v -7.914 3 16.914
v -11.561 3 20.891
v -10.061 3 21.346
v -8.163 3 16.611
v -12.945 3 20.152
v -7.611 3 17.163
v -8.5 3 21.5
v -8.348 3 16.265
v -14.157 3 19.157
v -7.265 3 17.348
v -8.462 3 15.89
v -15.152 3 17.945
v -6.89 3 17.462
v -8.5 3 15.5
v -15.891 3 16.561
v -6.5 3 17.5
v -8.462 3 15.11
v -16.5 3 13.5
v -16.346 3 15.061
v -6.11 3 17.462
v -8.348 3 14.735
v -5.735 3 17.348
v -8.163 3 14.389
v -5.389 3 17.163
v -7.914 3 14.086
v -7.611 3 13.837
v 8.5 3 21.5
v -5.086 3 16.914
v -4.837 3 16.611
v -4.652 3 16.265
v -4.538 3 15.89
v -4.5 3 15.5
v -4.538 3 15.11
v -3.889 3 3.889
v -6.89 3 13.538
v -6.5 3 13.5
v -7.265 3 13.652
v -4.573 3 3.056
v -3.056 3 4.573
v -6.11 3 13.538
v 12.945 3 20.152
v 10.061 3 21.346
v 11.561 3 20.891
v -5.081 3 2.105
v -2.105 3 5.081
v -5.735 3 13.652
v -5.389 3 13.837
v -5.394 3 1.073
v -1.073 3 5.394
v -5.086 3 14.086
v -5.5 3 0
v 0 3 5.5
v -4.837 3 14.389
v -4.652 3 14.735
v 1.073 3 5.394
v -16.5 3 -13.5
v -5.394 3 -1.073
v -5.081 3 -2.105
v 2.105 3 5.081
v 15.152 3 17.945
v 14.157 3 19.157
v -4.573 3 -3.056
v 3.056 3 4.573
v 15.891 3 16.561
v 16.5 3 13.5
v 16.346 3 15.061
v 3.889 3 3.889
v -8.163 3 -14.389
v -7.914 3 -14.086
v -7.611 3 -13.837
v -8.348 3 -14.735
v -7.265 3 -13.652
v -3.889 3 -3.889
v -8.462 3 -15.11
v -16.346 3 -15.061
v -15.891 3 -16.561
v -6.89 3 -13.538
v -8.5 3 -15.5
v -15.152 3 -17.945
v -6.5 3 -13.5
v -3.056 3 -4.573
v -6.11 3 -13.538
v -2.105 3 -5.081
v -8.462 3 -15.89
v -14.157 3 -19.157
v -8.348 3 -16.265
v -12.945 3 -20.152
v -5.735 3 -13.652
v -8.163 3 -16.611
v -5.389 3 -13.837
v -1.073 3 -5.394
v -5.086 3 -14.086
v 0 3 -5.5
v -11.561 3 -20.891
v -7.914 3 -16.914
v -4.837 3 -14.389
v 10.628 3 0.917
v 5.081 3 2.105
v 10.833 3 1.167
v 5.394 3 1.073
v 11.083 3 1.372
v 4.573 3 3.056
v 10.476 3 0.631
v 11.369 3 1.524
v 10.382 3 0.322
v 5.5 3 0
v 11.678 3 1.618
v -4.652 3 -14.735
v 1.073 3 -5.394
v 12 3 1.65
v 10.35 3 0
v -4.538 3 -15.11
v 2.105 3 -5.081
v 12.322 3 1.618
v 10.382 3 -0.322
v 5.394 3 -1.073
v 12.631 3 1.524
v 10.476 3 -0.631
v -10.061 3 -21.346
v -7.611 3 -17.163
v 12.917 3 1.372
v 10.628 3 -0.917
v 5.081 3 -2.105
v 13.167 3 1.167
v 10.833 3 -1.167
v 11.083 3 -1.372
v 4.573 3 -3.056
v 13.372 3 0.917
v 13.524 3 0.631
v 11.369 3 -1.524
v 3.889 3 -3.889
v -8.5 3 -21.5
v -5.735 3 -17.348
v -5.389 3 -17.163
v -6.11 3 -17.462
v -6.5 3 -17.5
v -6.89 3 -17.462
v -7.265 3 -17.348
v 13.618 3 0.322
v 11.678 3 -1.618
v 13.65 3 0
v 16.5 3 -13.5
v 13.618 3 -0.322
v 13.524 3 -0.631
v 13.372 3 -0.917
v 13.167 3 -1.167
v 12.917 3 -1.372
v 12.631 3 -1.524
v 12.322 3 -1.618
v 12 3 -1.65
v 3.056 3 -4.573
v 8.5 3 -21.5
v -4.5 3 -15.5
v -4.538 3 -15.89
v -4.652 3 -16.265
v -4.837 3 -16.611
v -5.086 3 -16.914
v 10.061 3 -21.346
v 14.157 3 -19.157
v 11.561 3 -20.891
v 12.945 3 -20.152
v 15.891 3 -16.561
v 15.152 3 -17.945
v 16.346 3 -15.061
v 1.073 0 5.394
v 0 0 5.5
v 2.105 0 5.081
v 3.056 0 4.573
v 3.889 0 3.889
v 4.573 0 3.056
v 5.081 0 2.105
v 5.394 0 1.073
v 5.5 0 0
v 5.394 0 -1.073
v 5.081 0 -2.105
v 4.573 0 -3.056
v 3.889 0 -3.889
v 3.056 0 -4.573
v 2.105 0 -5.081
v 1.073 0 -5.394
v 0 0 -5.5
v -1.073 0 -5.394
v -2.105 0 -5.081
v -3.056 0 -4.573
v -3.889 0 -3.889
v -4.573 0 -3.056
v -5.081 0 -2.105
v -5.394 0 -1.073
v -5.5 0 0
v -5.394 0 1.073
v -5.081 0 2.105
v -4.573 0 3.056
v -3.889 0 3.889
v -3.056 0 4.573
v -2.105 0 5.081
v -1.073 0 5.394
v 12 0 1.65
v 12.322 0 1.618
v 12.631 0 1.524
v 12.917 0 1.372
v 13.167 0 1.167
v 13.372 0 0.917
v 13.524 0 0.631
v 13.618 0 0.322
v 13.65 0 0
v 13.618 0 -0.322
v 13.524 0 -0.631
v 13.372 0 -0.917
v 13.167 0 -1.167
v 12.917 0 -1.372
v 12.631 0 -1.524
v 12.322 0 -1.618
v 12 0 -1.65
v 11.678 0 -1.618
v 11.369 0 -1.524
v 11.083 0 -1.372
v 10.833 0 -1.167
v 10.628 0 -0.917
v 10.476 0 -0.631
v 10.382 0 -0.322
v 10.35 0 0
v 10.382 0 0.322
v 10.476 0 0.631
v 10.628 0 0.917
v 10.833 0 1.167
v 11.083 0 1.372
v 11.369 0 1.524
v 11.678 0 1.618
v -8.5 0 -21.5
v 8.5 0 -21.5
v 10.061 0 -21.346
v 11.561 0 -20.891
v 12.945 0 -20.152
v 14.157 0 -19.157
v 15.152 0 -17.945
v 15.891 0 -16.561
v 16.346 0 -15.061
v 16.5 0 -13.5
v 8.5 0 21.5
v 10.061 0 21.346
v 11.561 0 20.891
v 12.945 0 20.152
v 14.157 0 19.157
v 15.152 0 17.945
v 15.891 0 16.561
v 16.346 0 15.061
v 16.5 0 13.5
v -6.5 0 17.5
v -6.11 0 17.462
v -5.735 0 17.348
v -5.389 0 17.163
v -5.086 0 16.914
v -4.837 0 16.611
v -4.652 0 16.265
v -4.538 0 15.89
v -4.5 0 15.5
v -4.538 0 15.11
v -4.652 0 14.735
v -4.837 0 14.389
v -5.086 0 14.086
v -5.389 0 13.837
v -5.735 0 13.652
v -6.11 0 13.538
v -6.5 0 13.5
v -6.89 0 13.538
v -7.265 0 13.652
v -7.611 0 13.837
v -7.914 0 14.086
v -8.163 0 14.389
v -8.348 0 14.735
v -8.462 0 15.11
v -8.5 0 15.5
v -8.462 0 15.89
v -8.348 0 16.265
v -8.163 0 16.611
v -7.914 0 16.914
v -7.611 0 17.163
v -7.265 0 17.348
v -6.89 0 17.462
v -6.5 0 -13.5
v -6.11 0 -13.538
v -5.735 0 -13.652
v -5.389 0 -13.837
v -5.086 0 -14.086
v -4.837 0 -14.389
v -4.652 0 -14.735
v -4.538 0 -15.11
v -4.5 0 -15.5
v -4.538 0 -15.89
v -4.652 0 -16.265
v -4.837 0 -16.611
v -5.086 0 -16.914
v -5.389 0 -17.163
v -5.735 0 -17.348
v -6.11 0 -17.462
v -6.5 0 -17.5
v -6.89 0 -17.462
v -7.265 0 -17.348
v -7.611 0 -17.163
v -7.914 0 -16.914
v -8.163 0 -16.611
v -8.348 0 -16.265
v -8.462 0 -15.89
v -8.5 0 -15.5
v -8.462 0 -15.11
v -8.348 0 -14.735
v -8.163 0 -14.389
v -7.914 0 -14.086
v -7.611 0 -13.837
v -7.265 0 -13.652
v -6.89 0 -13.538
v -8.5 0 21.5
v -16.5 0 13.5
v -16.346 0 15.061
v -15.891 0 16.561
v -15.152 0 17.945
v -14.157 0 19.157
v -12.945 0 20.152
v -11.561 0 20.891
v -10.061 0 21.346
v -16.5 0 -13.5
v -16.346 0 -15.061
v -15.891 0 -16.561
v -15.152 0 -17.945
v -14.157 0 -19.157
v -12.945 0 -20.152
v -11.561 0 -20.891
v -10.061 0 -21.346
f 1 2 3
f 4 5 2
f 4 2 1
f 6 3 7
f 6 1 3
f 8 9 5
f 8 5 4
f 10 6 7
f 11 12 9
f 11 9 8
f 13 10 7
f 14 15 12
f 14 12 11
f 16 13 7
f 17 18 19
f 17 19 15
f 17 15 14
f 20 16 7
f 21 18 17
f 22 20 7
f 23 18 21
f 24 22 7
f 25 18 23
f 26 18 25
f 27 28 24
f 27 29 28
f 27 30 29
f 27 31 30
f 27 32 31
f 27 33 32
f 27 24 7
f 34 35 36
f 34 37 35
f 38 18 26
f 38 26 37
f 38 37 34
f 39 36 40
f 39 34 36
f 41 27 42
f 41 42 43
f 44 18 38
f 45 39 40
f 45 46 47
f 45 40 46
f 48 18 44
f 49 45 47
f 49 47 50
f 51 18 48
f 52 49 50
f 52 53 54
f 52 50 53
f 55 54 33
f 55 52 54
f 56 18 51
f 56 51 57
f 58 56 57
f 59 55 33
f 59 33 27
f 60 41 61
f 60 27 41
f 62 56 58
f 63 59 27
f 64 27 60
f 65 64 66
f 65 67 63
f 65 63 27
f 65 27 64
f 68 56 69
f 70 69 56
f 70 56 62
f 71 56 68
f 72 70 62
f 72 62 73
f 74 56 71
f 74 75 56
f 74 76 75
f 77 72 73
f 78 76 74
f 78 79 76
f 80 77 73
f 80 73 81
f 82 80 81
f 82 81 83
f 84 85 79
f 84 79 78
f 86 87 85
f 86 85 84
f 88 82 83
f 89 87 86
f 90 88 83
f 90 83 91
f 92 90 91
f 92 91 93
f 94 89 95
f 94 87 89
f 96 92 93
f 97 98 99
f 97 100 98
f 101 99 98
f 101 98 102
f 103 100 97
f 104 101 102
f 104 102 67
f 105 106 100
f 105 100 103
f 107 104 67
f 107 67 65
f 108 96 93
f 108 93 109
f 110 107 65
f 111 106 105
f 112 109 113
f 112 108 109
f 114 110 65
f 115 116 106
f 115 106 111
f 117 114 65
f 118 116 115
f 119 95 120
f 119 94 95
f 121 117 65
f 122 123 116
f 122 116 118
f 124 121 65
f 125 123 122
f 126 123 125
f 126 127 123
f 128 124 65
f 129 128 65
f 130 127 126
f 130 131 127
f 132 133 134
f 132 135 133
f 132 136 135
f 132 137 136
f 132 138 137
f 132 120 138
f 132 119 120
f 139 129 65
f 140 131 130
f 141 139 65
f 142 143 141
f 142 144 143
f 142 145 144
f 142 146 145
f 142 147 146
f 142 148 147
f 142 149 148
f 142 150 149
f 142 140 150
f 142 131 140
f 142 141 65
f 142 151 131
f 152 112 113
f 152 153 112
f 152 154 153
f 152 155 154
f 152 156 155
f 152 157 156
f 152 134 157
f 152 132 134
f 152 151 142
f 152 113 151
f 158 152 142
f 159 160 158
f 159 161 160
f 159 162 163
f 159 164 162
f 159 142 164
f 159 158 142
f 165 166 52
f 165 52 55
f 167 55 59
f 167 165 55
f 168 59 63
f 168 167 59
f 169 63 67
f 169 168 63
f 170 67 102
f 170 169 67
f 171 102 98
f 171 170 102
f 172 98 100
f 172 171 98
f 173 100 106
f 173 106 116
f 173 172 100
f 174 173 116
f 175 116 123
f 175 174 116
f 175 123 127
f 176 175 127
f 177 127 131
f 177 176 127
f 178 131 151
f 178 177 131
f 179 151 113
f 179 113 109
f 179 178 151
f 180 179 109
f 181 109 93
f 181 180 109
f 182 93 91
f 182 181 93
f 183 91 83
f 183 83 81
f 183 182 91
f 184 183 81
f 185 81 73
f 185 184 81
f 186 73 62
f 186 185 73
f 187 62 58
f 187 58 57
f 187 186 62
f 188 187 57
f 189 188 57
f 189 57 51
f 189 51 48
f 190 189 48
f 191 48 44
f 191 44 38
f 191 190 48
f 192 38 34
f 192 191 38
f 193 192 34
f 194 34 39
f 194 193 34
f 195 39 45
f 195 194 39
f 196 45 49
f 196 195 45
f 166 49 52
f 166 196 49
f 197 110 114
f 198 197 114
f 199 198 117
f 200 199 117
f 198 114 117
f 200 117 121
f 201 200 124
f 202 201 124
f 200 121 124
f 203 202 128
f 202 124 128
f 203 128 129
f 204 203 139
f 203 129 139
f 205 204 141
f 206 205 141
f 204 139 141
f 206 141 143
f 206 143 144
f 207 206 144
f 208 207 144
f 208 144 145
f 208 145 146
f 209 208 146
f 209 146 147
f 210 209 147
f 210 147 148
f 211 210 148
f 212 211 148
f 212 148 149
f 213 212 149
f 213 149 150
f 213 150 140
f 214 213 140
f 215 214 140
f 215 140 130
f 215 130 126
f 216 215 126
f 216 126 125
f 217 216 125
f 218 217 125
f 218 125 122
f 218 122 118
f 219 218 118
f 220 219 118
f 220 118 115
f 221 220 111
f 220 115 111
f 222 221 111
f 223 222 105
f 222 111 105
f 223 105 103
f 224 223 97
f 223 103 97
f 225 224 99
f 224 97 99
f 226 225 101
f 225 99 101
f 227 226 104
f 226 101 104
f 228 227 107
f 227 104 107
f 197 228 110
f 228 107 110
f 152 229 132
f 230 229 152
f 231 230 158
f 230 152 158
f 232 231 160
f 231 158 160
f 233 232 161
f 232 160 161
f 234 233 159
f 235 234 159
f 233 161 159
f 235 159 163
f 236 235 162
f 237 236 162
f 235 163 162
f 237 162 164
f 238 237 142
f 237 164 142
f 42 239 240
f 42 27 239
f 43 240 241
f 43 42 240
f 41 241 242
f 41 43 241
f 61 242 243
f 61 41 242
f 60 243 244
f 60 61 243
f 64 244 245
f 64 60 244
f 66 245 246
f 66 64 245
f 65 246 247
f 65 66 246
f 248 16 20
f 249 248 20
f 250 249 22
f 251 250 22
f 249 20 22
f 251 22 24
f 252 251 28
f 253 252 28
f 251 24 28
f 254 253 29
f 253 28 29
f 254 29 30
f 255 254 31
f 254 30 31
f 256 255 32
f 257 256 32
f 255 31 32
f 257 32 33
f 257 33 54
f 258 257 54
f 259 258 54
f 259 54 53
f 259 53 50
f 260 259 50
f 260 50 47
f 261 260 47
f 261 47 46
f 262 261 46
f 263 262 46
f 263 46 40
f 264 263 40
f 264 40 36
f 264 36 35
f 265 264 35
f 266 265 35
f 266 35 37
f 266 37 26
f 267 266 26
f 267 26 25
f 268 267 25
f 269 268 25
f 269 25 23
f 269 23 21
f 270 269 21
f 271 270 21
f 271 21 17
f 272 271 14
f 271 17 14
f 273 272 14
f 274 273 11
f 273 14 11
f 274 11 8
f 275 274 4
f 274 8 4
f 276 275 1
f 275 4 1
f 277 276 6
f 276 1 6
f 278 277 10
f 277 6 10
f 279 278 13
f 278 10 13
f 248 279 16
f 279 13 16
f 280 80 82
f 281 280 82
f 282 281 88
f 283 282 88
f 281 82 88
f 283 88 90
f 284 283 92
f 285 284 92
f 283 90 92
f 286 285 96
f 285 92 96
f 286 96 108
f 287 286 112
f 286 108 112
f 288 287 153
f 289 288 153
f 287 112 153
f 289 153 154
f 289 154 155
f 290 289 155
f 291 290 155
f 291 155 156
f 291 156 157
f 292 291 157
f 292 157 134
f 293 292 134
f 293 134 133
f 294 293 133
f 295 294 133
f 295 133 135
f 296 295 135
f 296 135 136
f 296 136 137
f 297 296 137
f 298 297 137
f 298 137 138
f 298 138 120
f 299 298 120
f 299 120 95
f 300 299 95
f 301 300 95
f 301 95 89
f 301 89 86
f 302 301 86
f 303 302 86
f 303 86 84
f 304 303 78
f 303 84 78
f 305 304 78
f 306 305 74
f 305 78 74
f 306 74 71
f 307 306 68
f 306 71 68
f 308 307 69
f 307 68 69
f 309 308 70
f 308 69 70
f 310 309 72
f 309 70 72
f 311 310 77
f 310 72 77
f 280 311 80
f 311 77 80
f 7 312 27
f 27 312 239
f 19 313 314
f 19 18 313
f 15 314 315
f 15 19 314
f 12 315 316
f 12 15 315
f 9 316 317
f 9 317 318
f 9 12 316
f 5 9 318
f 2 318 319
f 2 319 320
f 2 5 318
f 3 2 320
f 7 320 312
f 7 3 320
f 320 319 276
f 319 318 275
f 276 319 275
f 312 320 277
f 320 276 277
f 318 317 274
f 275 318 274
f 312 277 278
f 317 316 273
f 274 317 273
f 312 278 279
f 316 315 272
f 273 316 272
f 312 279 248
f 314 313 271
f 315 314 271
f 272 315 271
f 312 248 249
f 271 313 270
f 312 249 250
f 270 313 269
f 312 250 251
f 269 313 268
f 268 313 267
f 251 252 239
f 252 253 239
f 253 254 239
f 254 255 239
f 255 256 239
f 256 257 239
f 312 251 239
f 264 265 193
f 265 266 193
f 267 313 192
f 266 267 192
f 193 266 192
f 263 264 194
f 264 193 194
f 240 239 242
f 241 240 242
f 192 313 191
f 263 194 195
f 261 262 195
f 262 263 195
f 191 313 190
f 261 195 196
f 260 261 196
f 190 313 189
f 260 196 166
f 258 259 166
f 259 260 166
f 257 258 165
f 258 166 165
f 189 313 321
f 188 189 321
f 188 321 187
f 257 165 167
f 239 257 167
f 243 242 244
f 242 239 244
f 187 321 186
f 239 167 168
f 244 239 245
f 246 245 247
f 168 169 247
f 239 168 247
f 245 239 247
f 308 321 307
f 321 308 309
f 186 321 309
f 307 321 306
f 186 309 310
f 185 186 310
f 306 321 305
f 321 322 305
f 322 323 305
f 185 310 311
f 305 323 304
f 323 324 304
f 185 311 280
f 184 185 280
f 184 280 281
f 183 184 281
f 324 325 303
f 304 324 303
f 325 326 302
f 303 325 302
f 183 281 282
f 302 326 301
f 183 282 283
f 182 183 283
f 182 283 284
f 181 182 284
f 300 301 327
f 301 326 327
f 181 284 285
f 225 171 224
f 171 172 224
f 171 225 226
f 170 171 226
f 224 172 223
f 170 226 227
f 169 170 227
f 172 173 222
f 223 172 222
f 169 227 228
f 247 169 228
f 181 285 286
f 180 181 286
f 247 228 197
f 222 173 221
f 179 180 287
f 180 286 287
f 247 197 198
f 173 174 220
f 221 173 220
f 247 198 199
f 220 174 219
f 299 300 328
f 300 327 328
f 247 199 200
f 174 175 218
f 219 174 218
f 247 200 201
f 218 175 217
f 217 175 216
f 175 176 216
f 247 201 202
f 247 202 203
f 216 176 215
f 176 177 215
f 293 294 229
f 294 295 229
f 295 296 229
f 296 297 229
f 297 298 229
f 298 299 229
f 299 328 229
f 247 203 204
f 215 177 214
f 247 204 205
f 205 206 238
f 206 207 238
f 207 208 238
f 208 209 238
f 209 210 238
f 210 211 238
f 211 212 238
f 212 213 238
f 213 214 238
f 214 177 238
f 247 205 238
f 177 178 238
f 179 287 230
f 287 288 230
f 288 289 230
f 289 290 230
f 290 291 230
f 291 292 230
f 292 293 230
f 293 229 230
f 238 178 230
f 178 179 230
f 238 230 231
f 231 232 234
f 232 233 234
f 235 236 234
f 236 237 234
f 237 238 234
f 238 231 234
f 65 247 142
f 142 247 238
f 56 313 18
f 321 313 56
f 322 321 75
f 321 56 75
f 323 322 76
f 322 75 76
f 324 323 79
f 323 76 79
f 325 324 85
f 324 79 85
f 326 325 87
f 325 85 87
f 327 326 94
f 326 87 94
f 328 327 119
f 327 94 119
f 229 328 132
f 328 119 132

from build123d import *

# Parameters (mm, degrees)
SKETCH1_W           = 33
SKETCH1_H           = 43
SKETCH1_R           = 5.5
BOSS_EXTRUDE1_DEPTH = 3
SKETCH2_R           = 2
SKETCH2_R_2         = 1.65
CUT_EXTRUDE1_DEPTH  = 10
FILLET1_R           = 8


with BuildPart() as part:
    # Sketch1 → Boss-Extrude1 (new body)
    with BuildSketch(Plane(origin=(0, 0, 0), x_dir=(1, 0, 0), z_dir=(0, 1, 0))):
        Rectangle(SKETCH1_W, SKETCH1_H)
        with Locations(Location((0, 0, 0), (0, 0, 270))):
            Circle(SKETCH1_R, mode=Mode.SUBTRACT)
    extrude(amount=BOSS_EXTRUDE1_DEPTH)

    # Sketch2 → Cut-Extrude1 (cut)
    with BuildSketch(Plane(origin=(0, 3, 0), x_dir=(1, 0, 0), z_dir=(0, 1, 0))):
        with Locations(Location((-6.5, 15.5, 0), (0, 0, 270))):
            Circle(SKETCH2_R)
        with Locations(Location((-6.5, -15.5, 0), (0, 0, 270))):
            Circle(SKETCH2_R)
        with Locations(Location((12, 0, 0), (0, 0, 270))):
            Circle(SKETCH2_R_2)
    extrude(amount=-CUT_EXTRUDE1_DEPTH, mode=Mode.SUBTRACT)

    # Fillet1
    fillet1_edges = [part.edges().sort_by_distance(p)[0] for p in [
        (16.5, 1.5, 21.5),
        (-16.5, 1.5, 21.5),
        (-16.5, 1.5, -21.5),
        (16.5, 1.5, -21.5),
    ]]
    fillet(fillet1_edges, radius=FILLET1_R)


solid = part.part
